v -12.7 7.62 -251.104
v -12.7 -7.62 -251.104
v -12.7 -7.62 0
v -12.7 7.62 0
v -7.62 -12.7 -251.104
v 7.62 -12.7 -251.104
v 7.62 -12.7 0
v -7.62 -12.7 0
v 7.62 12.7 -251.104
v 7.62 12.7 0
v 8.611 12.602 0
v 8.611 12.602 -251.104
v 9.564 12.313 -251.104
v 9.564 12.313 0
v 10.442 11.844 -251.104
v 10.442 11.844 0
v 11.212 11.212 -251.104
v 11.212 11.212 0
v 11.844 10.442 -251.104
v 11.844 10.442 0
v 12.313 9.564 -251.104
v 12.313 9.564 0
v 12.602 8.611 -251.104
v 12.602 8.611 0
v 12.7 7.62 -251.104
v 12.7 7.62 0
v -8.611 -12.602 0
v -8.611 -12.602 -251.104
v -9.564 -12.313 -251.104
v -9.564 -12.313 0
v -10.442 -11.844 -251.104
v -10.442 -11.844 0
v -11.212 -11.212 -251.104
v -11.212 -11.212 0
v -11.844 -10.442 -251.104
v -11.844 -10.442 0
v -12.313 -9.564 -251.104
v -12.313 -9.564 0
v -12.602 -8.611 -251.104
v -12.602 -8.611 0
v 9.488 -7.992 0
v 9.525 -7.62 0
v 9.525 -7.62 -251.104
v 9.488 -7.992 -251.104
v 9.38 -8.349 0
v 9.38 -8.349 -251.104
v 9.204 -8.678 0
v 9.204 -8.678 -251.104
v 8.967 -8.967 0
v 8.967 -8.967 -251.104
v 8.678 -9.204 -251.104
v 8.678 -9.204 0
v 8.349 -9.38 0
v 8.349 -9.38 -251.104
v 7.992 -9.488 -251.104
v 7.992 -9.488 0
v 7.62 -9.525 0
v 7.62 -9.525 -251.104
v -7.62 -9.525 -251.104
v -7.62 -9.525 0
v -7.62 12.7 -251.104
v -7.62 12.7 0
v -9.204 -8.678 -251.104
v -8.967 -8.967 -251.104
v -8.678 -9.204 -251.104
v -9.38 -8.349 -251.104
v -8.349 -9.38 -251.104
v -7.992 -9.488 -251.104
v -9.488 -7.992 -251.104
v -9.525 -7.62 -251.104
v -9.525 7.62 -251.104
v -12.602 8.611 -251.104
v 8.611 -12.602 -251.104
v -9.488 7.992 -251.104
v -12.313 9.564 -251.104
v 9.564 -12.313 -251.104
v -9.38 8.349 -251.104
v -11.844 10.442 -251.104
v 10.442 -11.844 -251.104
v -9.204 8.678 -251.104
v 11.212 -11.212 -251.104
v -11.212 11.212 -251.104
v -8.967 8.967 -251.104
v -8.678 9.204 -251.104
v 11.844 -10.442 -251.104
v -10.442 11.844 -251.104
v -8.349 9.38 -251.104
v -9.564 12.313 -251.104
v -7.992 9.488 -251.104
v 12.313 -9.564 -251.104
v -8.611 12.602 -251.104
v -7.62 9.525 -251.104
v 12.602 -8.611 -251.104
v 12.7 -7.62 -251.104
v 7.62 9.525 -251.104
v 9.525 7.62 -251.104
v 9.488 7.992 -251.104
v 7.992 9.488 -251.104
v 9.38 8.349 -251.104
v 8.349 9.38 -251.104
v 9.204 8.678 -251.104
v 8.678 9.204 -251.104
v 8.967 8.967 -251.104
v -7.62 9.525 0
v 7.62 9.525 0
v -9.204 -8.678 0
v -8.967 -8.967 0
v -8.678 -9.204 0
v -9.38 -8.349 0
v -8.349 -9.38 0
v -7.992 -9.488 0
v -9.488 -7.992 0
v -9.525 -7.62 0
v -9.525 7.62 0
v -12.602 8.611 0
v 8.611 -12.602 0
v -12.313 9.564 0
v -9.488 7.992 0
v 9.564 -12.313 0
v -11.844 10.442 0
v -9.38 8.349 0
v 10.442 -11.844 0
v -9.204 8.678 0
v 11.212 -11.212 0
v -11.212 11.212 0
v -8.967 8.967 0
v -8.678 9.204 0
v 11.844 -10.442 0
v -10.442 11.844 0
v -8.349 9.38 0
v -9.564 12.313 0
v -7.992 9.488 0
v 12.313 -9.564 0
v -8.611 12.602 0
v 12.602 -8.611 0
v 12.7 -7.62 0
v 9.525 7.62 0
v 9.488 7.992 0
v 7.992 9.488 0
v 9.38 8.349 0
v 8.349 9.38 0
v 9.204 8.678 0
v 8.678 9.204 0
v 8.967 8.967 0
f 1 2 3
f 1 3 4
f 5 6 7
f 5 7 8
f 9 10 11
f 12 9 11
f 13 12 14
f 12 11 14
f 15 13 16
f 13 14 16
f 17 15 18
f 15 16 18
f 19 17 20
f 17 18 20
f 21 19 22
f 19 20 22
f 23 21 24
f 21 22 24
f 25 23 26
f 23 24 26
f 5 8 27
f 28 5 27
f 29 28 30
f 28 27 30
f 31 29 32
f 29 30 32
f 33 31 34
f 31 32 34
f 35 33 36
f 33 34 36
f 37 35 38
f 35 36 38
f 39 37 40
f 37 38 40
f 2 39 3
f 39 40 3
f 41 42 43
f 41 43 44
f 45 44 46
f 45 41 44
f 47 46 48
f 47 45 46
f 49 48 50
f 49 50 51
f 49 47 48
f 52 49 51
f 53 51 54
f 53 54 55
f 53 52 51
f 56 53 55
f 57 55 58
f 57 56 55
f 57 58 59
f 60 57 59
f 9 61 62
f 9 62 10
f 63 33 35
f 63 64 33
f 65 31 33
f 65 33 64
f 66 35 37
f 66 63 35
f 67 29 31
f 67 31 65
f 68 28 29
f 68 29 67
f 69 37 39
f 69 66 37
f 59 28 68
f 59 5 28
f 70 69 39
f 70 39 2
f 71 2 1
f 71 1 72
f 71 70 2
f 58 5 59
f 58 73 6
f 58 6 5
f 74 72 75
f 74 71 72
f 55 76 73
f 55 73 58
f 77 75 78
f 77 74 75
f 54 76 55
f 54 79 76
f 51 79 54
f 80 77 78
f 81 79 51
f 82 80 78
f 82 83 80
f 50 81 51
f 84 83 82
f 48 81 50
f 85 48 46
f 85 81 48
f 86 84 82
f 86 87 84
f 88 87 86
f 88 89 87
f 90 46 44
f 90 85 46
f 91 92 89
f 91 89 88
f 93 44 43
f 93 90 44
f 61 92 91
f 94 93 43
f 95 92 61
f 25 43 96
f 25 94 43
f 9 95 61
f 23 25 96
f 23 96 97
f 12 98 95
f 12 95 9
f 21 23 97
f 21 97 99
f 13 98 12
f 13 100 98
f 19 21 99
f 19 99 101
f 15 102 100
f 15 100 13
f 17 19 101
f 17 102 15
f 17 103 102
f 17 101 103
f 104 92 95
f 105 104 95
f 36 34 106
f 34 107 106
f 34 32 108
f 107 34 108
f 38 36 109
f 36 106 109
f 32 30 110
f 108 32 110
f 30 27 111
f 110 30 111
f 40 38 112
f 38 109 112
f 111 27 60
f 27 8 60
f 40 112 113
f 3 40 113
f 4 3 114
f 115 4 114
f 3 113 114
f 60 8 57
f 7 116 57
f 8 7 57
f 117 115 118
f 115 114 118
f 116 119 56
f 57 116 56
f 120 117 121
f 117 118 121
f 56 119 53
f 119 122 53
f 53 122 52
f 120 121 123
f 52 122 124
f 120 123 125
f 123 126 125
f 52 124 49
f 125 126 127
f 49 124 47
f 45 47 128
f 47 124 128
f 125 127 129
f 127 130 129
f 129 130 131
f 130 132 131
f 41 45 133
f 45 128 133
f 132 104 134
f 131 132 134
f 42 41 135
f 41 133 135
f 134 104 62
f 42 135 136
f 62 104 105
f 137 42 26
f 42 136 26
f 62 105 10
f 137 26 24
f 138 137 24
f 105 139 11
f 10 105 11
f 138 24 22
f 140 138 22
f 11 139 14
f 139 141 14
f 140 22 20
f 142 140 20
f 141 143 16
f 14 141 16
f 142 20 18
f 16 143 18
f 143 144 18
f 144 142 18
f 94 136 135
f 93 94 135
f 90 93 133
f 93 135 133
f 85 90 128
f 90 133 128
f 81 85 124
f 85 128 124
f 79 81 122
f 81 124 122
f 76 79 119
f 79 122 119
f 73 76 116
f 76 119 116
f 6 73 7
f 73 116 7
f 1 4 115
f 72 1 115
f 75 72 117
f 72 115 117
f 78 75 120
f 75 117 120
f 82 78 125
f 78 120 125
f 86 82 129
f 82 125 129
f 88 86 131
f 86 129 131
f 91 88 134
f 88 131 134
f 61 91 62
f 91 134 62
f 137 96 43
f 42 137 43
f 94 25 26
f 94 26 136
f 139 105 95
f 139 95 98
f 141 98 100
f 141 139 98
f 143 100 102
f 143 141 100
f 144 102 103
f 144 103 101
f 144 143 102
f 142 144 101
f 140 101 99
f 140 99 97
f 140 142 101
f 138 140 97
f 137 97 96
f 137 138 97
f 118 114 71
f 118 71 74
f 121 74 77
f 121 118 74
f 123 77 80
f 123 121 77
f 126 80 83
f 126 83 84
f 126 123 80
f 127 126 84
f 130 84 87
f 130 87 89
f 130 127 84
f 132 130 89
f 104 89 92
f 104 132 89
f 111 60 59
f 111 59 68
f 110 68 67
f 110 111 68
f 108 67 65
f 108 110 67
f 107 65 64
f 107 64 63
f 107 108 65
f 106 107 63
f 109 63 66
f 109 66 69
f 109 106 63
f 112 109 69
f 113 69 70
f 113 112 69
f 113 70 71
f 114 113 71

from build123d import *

# Parameters (mm, degrees)
SQUARE_TUBING_1_X_1_X_0_125_1_DEPTH = 251.1044


with BuildPart() as part:
    # Sketch11 → Square tubing 1 X 1 X 0.125(1) (new body)
    with BuildSketch(Plane.YX):
        with BuildLine():
            Line((-7.62, -12.7), (7.62, -12.7))
            ThreePointArc((7.62, -12.7), (11.212102448, -11.212102448), (12.7, -7.62))
            Line((12.7, -7.62), (12.7, 7.62))
            ThreePointArc((12.7, 7.62), (11.212102448, 11.212102448), (7.62, 12.7))
            Line((7.62, 12.7), (-7.62, 12.7))
            ThreePointArc((-7.62, 12.7), (-11.212102448, 11.212102448), (-12.7, 7.62))
            Line((-12.7, 7.62), (-12.7, -7.62))
            ThreePointArc((-12.7, -7.62), (-11.212102448, -11.212102448), (-7.62, -12.7))
        make_face()
        with BuildLine():
            Line((-7.62, -9.525), (7.62, -9.525))
            ThreePointArc((7.62, -9.525), (8.967038418, -8.967038418), (9.525, -7.62))
            Line((9.525, -7.62), (9.525, 7.62))
            ThreePointArc((9.525, 7.62), (8.967038418, 8.967038418), (7.62, 9.525))
            Line((7.62, 9.525), (-7.62, 9.525))
            ThreePointArc((-7.62, 9.525), (-8.967038418, 8.967038418), (-9.525, 7.62))
            Line((-9.525, 7.62), (-9.525, -7.62))
            ThreePointArc((-9.525, -7.62), (-8.967038418, -8.967038418), (-7.62, -9.525))
        make_face(mode=Mode.SUBTRACT)
    extrude(amount=SQUARE_TUBING_1_X_1_X_0_125_1_DEPTH)


solid = part.part
